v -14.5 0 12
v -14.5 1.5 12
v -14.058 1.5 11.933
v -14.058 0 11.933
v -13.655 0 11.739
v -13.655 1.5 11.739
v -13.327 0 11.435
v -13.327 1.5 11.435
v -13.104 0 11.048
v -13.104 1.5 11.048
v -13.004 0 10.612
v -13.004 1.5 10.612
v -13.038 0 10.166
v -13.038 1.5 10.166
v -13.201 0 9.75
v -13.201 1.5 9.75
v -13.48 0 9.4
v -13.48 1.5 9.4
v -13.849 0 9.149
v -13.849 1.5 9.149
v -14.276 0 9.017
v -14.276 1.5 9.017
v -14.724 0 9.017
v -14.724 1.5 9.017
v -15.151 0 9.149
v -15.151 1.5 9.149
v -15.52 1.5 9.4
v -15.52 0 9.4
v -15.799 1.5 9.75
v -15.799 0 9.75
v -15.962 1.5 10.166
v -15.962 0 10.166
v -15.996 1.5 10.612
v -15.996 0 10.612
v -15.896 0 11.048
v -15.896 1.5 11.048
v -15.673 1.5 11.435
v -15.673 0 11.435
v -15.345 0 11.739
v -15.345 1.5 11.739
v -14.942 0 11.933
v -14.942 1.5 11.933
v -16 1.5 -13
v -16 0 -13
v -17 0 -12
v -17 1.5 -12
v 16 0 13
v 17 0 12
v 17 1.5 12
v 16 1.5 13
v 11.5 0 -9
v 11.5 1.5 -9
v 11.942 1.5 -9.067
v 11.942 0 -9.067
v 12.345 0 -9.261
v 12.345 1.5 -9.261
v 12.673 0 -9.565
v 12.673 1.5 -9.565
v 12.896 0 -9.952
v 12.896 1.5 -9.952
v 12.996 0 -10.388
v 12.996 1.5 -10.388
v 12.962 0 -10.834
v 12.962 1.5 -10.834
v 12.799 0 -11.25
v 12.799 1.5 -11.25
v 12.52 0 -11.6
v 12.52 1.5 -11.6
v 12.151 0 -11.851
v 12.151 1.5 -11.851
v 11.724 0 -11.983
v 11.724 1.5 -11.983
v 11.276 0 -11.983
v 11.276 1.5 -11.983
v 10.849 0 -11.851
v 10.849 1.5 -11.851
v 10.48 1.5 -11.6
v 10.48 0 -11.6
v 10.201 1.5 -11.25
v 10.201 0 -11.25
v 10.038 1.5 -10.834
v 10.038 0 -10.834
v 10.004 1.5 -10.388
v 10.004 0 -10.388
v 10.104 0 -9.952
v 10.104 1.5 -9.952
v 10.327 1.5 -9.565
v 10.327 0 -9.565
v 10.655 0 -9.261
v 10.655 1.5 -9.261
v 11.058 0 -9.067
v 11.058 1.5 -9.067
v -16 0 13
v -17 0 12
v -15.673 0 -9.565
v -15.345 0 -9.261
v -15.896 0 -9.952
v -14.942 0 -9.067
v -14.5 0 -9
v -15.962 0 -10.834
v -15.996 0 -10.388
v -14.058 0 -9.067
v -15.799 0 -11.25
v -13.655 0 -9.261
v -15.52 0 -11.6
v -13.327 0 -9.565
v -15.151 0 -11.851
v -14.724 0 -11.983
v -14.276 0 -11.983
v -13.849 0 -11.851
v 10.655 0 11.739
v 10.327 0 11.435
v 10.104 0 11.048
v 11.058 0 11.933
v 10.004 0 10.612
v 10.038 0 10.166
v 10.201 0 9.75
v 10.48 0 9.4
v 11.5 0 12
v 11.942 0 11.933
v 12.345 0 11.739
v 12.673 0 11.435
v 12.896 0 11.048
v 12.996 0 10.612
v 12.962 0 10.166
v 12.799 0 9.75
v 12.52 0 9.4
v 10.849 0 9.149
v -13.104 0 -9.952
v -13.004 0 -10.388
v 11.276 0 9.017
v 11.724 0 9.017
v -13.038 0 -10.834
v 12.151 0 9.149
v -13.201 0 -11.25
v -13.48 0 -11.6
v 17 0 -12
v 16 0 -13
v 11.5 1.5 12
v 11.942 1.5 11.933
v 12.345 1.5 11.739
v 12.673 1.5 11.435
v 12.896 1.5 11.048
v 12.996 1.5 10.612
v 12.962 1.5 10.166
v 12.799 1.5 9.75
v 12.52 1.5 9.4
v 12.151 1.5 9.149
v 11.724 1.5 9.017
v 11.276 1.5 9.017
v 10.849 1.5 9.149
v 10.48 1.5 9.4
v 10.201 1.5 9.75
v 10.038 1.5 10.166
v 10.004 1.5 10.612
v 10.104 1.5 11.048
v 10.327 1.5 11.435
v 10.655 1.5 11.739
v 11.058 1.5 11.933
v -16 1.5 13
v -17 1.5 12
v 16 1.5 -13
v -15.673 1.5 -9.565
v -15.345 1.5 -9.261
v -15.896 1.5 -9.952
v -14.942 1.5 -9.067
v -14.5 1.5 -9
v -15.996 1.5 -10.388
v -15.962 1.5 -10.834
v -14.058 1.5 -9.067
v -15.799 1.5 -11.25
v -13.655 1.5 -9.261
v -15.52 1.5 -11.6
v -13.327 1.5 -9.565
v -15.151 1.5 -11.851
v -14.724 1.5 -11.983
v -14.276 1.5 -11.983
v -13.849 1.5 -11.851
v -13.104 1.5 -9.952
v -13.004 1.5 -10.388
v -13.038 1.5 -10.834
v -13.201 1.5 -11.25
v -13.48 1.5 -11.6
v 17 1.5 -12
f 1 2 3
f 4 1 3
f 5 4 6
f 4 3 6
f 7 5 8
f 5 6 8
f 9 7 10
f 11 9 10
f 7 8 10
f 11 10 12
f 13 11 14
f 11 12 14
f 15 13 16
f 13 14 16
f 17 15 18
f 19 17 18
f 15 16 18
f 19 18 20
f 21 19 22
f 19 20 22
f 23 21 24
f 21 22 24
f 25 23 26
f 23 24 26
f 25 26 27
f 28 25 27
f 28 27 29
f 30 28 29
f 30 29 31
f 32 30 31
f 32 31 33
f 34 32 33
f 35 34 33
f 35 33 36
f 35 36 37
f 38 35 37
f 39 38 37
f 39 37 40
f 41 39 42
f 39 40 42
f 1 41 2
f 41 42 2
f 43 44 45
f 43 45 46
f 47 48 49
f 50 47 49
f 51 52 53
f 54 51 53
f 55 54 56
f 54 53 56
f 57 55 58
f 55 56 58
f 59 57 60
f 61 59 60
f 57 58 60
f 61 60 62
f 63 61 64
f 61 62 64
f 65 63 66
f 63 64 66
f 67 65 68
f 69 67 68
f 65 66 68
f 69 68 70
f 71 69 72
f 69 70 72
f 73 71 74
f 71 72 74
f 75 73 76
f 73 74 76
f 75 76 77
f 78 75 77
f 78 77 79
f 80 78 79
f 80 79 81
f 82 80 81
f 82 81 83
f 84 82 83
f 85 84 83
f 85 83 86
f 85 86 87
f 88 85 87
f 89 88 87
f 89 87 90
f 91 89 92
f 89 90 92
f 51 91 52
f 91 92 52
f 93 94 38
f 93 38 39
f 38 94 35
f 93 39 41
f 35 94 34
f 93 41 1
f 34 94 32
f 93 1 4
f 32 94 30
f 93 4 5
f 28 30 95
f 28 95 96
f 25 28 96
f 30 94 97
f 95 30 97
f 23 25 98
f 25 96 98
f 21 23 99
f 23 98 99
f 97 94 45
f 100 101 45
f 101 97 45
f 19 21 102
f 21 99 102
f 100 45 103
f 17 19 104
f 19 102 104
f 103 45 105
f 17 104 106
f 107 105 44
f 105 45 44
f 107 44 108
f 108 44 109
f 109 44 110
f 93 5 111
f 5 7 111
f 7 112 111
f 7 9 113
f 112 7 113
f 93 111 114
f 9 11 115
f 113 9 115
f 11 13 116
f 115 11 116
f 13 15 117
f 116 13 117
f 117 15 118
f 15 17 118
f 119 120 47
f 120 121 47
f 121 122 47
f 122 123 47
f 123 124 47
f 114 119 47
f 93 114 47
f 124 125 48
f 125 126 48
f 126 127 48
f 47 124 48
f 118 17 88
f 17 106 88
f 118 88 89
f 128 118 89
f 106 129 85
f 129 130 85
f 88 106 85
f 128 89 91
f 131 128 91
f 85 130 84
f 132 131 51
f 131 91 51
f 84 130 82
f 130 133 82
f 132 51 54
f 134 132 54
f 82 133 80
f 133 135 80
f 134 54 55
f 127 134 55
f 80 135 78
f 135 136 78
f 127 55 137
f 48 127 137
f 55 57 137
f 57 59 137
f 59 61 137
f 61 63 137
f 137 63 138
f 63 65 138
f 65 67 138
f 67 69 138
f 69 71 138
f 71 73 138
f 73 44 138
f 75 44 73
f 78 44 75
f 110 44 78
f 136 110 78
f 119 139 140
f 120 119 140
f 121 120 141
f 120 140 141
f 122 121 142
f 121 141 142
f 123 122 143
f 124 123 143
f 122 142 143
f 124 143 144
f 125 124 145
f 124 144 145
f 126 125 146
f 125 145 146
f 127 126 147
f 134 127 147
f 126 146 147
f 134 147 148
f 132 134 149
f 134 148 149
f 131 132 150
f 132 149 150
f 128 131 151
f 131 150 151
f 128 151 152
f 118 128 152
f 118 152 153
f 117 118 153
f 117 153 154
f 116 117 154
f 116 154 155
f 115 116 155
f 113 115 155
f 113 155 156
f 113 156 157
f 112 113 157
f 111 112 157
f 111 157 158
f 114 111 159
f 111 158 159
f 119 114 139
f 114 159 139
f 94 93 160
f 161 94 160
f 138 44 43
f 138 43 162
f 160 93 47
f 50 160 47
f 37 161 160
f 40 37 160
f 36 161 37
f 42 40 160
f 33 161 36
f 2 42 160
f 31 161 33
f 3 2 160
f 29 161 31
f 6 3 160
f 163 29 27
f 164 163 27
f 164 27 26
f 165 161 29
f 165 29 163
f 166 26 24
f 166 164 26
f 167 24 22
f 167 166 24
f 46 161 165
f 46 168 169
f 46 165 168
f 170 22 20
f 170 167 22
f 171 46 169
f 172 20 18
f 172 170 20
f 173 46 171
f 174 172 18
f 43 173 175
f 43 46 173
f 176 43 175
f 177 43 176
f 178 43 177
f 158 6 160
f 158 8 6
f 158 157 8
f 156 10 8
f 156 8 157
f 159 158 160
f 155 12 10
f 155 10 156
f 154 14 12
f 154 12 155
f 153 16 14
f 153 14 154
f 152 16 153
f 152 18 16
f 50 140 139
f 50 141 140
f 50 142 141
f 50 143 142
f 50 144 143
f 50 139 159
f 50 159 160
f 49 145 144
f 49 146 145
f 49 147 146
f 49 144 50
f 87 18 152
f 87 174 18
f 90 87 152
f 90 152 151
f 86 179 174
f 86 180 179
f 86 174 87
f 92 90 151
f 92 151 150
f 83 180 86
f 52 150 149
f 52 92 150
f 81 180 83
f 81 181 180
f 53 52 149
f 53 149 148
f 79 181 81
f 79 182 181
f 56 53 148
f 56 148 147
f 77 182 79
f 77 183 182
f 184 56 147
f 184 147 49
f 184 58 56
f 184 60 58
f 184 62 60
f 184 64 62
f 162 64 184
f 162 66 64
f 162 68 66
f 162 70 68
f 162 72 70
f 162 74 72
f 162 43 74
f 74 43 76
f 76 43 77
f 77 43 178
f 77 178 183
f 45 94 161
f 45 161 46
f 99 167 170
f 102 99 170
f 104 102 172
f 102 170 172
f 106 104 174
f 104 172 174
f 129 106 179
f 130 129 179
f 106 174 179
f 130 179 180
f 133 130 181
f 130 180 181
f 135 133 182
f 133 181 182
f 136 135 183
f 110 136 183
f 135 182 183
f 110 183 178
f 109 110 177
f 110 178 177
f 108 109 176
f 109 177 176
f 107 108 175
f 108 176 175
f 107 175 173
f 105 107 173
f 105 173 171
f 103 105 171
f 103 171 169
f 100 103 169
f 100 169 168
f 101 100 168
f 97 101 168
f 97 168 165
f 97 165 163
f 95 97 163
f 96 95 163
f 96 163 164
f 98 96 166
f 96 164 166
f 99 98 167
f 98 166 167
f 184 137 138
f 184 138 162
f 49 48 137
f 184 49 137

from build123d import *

# Parameters (mm, degrees)
SKETCH1_W           = 34
SKETCH1_H           = 26
BOSS_EXTRUDE1_DEPTH = 1.5
SKETCH2_R           = 1.5
CUT_EXTRUDE1_DEPTH  = 1.5
CHAMFER1_SIZE       = 1


with BuildPart() as part:
    # Sketch1 → Boss-Extrude1 (new body)
    with BuildSketch(Plane(origin=(0, 0, 0), x_dir=(1, 0, 0), z_dir=(0, 1, 0))):
        Rectangle(SKETCH1_W, SKETCH1_H)
    extrude(amount=BOSS_EXTRUDE1_DEPTH)

    # Sketch2 → Cut-Extrude1 (cut)
    with BuildSketch(Plane(origin=(0, 1.5, 0), x_dir=(1, 0, 0), z_dir=(0, 1, 0))):
        with Locations(Location((-14.5, 10.5, 0), (0, 0, 270))):
            Circle(SKETCH2_R)
        with Locations(Location((11.5, 10.5, 0), (0, 0, 270))):
            Circle(SKETCH2_R)
        with Locations(Location((11.5, -10.5, 0), (0, 0, 270))):
            Circle(SKETCH2_R)
        with Locations(Location((-14.5, -10.5, 0), (0, 0, 270))):
            Circle(SKETCH2_R)
    extrude(amount=-CUT_EXTRUDE1_DEPTH, mode=Mode.SUBTRACT)

    # Chamfer1
    chamfer1_edges = [part.edges().sort_by_distance(p)[0] for p in [
        (17, 0.75, 13),
        (-17, 0.75, 13),
        (-17, 0.75, -13),
        (17, 0.75, -13),
    ]]
    chamfer(chamfer1_edges, length=CHAMFER1_SIZE)


solid = part.part
